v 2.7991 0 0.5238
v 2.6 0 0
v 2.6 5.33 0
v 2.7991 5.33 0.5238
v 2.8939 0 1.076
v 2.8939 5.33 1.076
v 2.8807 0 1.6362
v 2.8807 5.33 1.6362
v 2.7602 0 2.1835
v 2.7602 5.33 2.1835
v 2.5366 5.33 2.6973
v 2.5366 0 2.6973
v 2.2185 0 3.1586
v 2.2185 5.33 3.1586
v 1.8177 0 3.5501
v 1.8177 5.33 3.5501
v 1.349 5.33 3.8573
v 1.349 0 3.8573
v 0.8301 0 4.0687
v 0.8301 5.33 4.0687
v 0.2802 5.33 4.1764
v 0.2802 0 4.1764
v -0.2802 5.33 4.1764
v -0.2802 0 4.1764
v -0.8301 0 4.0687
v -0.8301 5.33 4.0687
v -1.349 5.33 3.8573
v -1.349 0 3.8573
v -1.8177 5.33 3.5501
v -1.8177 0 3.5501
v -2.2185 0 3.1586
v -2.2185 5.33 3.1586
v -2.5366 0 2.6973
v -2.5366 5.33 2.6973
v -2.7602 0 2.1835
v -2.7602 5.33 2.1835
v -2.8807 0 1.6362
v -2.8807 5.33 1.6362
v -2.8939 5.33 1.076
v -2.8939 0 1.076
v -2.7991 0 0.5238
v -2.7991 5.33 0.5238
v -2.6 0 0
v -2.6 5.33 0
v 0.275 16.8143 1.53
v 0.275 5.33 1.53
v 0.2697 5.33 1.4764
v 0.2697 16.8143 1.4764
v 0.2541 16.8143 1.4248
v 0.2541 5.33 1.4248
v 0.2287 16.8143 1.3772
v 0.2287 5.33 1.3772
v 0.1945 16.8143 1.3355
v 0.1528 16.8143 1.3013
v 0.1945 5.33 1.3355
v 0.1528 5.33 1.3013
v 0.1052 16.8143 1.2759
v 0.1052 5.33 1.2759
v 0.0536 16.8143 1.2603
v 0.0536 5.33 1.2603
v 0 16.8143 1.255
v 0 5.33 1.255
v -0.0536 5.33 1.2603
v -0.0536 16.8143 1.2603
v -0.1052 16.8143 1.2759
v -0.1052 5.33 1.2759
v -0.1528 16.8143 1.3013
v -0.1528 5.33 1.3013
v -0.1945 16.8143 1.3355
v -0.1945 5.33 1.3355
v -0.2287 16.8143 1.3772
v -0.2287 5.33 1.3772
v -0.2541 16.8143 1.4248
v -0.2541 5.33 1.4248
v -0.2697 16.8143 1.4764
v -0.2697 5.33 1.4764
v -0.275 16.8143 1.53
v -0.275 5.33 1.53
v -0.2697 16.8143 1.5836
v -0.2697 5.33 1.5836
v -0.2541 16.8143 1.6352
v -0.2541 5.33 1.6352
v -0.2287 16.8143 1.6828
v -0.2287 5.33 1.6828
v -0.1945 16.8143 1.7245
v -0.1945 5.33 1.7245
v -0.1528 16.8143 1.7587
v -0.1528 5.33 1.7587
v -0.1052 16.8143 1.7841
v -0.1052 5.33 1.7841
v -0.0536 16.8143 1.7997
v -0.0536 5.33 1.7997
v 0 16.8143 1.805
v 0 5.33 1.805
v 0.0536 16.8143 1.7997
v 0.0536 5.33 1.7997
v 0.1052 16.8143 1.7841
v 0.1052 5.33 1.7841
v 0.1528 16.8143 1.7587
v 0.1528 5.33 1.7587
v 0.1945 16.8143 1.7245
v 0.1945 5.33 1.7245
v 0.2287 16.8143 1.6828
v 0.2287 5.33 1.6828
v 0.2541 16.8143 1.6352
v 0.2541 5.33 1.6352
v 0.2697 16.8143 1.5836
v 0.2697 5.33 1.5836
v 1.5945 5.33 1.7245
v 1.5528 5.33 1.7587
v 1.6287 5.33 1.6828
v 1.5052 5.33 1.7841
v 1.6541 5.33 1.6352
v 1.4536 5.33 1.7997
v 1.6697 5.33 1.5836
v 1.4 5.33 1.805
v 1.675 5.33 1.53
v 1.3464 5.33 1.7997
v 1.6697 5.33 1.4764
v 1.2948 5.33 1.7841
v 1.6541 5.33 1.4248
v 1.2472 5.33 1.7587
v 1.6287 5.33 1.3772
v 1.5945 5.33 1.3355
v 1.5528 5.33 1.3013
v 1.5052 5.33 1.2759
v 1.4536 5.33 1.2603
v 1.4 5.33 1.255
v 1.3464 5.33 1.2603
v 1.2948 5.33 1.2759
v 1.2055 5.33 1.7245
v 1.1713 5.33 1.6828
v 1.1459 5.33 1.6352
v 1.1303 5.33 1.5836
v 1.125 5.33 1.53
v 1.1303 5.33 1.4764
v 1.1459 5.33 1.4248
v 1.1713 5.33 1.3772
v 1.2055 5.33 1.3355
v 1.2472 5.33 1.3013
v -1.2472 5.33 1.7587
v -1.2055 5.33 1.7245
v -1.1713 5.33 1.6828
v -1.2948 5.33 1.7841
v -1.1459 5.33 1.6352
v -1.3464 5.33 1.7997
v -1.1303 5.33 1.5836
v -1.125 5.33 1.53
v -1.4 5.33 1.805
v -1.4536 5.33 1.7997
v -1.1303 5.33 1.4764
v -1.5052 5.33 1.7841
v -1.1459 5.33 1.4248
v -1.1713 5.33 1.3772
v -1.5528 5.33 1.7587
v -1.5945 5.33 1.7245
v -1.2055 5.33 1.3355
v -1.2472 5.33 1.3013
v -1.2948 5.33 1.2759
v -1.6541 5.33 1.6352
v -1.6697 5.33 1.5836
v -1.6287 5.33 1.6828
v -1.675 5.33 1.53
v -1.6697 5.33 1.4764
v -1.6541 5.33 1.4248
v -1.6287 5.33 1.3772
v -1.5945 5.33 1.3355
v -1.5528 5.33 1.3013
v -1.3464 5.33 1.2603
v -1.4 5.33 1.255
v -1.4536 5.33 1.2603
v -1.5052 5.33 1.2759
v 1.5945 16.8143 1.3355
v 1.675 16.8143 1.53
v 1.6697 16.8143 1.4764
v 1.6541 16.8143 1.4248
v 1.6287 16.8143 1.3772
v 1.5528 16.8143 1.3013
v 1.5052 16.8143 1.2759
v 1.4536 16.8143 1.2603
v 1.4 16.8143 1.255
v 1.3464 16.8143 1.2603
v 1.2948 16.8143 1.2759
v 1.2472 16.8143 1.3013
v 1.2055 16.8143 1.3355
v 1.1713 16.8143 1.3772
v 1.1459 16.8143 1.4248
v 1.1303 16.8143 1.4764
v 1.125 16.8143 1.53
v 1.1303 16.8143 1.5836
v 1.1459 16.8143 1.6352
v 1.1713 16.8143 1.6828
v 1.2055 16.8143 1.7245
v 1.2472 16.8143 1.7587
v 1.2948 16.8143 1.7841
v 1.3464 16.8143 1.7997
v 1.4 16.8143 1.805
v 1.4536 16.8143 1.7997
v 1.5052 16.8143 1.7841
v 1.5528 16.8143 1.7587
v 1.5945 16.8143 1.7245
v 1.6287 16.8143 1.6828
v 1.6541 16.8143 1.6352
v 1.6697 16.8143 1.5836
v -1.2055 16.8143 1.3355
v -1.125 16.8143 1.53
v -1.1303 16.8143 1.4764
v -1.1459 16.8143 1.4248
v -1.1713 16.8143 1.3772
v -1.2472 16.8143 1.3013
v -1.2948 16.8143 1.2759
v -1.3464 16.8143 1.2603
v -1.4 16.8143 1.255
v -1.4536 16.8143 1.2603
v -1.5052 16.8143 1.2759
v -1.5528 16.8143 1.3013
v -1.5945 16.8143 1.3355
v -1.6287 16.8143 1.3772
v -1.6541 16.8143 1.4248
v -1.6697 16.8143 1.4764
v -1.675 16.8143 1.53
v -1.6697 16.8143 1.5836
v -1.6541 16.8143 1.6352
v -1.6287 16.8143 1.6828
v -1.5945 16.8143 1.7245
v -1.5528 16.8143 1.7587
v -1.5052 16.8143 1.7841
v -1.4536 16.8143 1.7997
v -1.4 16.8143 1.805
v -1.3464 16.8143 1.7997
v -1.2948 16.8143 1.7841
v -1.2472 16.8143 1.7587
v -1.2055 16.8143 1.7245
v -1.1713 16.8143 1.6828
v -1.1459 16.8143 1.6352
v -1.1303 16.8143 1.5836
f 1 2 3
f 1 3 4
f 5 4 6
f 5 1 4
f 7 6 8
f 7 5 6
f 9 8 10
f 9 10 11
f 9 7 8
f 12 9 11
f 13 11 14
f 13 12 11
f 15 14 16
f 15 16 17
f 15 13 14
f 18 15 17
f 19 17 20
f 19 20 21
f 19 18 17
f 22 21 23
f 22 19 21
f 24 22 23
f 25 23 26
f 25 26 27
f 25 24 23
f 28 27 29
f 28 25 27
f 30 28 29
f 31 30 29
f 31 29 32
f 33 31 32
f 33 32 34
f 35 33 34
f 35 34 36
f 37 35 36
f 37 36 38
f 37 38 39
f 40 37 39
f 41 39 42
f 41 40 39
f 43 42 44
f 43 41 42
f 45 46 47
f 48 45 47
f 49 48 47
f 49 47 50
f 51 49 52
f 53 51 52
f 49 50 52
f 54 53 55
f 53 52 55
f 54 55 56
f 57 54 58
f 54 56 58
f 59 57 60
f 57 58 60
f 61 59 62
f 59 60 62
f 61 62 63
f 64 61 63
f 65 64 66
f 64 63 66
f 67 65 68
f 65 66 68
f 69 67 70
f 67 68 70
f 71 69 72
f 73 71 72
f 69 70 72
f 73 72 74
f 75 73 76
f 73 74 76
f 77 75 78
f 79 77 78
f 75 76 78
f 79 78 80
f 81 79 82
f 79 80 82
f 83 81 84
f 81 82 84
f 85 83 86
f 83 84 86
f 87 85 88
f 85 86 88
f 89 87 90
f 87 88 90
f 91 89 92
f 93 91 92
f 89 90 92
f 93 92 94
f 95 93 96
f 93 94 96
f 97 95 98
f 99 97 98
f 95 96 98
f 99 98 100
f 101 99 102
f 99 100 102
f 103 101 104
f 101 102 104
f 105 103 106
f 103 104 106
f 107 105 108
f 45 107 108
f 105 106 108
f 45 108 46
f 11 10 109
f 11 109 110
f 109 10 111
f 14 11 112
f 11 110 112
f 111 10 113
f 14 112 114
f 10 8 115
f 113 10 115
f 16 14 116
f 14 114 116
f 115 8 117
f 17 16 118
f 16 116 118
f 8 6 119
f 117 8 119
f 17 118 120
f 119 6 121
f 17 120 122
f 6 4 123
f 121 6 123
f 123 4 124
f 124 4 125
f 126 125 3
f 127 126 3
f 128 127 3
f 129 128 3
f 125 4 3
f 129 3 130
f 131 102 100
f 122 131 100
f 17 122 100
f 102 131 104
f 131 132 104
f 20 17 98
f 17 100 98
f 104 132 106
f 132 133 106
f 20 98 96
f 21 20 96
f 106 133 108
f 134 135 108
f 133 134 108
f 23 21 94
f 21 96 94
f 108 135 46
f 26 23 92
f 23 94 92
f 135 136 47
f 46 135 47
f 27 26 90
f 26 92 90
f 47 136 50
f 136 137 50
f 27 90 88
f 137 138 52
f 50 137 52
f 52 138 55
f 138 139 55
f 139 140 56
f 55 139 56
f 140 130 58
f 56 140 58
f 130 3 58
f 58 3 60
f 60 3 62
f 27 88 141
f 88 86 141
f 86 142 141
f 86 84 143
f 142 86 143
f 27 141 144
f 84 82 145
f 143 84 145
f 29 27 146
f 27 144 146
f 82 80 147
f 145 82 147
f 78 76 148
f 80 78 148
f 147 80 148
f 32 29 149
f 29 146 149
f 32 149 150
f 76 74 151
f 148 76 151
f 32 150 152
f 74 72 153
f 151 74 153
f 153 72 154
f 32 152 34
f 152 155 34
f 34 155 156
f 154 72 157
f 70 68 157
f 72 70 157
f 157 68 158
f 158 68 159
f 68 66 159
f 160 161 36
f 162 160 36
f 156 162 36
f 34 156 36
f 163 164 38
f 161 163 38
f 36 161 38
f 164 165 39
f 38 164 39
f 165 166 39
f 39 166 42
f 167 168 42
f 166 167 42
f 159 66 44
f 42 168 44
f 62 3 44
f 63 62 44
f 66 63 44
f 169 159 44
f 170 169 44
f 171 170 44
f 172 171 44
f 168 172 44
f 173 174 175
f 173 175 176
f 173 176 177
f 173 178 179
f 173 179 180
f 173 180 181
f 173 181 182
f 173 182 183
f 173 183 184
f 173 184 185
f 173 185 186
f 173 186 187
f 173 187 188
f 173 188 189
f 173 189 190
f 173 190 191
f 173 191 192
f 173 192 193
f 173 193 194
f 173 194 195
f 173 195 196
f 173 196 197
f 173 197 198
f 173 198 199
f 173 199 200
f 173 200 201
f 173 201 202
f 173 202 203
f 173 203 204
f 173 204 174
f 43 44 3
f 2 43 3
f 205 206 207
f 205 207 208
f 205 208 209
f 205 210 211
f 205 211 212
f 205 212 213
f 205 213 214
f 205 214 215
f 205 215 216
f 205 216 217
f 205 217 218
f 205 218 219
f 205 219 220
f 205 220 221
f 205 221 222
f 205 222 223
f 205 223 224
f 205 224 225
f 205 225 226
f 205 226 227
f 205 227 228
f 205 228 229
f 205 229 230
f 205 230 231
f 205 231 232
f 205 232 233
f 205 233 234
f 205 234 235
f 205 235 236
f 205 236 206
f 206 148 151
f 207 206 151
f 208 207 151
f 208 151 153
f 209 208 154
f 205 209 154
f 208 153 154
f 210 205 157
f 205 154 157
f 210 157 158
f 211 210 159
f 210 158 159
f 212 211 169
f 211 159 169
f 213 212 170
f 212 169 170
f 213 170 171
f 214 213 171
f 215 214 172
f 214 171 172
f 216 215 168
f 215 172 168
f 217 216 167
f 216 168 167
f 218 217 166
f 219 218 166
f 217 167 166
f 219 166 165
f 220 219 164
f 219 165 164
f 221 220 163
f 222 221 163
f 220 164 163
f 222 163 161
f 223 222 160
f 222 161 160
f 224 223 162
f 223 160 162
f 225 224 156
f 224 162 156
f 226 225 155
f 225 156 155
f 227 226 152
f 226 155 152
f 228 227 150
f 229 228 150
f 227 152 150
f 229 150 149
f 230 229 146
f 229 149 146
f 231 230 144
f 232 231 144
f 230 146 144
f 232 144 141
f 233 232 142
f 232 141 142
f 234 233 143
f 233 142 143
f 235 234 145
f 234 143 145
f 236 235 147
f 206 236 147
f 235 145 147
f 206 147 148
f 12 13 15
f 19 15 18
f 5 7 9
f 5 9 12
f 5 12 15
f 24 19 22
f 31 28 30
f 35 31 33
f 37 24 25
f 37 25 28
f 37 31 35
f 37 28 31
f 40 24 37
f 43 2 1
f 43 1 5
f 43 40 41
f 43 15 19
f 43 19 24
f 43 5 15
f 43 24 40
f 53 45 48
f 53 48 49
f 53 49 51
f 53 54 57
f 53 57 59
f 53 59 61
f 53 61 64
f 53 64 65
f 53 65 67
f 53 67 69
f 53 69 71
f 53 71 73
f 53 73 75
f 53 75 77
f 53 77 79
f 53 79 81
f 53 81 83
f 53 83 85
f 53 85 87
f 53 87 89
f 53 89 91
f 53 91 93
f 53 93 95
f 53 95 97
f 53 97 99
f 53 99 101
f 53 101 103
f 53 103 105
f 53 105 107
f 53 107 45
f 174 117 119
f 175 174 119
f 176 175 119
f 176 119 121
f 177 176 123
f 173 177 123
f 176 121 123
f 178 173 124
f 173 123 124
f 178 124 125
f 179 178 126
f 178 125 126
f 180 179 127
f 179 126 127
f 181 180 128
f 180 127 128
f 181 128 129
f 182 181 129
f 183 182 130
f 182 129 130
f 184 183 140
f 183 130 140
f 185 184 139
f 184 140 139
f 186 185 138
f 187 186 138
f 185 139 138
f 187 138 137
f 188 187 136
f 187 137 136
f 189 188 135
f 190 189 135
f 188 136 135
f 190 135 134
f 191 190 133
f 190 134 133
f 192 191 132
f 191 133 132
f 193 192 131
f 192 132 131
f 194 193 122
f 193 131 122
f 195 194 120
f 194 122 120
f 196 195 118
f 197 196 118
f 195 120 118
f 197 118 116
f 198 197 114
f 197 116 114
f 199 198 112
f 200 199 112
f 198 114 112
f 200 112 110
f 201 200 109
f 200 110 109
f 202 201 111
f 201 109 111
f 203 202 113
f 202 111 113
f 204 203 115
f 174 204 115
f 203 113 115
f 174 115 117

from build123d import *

# Parameters (mm, degrees)
BOSS_EXTRUDE1_DEPTH = 5.33
SKETCH2_R           = 0.275
BOSS_EXTRUDE2_DEPTH = 11.48431719


with BuildPart() as part:
    # Sketch1 → Boss-Extrude1 (new body)
    with BuildSketch(Plane(origin=(0, 0, 0), x_dir=(1, 0, 0), z_dir=(0, 1, 0))):
        with BuildLine():
            Line((-2.6, 0), (2.6, 0))
            ThreePointArc((2.6, 0), (0, -4.19), (-2.6, 0))
        make_face()
    extrude(amount=BOSS_EXTRUDE1_DEPTH)

    # Sketch2 → Boss-Extrude2 (add)
    with BuildSketch(Plane(origin=(0, 5.33, 0), x_dir=(1, 0, 0), z_dir=(0, 1, 0))):
        with Locations((0, -1.53)):
            Circle(SKETCH2_R)
        with Locations((-1.4, -1.53)):
            Circle(SKETCH2_R)
        with Locations((1.4, -1.53)):
            Circle(SKETCH2_R)
    extrude(amount=BOSS_EXTRUDE2_DEPTH)


solid = part.part
